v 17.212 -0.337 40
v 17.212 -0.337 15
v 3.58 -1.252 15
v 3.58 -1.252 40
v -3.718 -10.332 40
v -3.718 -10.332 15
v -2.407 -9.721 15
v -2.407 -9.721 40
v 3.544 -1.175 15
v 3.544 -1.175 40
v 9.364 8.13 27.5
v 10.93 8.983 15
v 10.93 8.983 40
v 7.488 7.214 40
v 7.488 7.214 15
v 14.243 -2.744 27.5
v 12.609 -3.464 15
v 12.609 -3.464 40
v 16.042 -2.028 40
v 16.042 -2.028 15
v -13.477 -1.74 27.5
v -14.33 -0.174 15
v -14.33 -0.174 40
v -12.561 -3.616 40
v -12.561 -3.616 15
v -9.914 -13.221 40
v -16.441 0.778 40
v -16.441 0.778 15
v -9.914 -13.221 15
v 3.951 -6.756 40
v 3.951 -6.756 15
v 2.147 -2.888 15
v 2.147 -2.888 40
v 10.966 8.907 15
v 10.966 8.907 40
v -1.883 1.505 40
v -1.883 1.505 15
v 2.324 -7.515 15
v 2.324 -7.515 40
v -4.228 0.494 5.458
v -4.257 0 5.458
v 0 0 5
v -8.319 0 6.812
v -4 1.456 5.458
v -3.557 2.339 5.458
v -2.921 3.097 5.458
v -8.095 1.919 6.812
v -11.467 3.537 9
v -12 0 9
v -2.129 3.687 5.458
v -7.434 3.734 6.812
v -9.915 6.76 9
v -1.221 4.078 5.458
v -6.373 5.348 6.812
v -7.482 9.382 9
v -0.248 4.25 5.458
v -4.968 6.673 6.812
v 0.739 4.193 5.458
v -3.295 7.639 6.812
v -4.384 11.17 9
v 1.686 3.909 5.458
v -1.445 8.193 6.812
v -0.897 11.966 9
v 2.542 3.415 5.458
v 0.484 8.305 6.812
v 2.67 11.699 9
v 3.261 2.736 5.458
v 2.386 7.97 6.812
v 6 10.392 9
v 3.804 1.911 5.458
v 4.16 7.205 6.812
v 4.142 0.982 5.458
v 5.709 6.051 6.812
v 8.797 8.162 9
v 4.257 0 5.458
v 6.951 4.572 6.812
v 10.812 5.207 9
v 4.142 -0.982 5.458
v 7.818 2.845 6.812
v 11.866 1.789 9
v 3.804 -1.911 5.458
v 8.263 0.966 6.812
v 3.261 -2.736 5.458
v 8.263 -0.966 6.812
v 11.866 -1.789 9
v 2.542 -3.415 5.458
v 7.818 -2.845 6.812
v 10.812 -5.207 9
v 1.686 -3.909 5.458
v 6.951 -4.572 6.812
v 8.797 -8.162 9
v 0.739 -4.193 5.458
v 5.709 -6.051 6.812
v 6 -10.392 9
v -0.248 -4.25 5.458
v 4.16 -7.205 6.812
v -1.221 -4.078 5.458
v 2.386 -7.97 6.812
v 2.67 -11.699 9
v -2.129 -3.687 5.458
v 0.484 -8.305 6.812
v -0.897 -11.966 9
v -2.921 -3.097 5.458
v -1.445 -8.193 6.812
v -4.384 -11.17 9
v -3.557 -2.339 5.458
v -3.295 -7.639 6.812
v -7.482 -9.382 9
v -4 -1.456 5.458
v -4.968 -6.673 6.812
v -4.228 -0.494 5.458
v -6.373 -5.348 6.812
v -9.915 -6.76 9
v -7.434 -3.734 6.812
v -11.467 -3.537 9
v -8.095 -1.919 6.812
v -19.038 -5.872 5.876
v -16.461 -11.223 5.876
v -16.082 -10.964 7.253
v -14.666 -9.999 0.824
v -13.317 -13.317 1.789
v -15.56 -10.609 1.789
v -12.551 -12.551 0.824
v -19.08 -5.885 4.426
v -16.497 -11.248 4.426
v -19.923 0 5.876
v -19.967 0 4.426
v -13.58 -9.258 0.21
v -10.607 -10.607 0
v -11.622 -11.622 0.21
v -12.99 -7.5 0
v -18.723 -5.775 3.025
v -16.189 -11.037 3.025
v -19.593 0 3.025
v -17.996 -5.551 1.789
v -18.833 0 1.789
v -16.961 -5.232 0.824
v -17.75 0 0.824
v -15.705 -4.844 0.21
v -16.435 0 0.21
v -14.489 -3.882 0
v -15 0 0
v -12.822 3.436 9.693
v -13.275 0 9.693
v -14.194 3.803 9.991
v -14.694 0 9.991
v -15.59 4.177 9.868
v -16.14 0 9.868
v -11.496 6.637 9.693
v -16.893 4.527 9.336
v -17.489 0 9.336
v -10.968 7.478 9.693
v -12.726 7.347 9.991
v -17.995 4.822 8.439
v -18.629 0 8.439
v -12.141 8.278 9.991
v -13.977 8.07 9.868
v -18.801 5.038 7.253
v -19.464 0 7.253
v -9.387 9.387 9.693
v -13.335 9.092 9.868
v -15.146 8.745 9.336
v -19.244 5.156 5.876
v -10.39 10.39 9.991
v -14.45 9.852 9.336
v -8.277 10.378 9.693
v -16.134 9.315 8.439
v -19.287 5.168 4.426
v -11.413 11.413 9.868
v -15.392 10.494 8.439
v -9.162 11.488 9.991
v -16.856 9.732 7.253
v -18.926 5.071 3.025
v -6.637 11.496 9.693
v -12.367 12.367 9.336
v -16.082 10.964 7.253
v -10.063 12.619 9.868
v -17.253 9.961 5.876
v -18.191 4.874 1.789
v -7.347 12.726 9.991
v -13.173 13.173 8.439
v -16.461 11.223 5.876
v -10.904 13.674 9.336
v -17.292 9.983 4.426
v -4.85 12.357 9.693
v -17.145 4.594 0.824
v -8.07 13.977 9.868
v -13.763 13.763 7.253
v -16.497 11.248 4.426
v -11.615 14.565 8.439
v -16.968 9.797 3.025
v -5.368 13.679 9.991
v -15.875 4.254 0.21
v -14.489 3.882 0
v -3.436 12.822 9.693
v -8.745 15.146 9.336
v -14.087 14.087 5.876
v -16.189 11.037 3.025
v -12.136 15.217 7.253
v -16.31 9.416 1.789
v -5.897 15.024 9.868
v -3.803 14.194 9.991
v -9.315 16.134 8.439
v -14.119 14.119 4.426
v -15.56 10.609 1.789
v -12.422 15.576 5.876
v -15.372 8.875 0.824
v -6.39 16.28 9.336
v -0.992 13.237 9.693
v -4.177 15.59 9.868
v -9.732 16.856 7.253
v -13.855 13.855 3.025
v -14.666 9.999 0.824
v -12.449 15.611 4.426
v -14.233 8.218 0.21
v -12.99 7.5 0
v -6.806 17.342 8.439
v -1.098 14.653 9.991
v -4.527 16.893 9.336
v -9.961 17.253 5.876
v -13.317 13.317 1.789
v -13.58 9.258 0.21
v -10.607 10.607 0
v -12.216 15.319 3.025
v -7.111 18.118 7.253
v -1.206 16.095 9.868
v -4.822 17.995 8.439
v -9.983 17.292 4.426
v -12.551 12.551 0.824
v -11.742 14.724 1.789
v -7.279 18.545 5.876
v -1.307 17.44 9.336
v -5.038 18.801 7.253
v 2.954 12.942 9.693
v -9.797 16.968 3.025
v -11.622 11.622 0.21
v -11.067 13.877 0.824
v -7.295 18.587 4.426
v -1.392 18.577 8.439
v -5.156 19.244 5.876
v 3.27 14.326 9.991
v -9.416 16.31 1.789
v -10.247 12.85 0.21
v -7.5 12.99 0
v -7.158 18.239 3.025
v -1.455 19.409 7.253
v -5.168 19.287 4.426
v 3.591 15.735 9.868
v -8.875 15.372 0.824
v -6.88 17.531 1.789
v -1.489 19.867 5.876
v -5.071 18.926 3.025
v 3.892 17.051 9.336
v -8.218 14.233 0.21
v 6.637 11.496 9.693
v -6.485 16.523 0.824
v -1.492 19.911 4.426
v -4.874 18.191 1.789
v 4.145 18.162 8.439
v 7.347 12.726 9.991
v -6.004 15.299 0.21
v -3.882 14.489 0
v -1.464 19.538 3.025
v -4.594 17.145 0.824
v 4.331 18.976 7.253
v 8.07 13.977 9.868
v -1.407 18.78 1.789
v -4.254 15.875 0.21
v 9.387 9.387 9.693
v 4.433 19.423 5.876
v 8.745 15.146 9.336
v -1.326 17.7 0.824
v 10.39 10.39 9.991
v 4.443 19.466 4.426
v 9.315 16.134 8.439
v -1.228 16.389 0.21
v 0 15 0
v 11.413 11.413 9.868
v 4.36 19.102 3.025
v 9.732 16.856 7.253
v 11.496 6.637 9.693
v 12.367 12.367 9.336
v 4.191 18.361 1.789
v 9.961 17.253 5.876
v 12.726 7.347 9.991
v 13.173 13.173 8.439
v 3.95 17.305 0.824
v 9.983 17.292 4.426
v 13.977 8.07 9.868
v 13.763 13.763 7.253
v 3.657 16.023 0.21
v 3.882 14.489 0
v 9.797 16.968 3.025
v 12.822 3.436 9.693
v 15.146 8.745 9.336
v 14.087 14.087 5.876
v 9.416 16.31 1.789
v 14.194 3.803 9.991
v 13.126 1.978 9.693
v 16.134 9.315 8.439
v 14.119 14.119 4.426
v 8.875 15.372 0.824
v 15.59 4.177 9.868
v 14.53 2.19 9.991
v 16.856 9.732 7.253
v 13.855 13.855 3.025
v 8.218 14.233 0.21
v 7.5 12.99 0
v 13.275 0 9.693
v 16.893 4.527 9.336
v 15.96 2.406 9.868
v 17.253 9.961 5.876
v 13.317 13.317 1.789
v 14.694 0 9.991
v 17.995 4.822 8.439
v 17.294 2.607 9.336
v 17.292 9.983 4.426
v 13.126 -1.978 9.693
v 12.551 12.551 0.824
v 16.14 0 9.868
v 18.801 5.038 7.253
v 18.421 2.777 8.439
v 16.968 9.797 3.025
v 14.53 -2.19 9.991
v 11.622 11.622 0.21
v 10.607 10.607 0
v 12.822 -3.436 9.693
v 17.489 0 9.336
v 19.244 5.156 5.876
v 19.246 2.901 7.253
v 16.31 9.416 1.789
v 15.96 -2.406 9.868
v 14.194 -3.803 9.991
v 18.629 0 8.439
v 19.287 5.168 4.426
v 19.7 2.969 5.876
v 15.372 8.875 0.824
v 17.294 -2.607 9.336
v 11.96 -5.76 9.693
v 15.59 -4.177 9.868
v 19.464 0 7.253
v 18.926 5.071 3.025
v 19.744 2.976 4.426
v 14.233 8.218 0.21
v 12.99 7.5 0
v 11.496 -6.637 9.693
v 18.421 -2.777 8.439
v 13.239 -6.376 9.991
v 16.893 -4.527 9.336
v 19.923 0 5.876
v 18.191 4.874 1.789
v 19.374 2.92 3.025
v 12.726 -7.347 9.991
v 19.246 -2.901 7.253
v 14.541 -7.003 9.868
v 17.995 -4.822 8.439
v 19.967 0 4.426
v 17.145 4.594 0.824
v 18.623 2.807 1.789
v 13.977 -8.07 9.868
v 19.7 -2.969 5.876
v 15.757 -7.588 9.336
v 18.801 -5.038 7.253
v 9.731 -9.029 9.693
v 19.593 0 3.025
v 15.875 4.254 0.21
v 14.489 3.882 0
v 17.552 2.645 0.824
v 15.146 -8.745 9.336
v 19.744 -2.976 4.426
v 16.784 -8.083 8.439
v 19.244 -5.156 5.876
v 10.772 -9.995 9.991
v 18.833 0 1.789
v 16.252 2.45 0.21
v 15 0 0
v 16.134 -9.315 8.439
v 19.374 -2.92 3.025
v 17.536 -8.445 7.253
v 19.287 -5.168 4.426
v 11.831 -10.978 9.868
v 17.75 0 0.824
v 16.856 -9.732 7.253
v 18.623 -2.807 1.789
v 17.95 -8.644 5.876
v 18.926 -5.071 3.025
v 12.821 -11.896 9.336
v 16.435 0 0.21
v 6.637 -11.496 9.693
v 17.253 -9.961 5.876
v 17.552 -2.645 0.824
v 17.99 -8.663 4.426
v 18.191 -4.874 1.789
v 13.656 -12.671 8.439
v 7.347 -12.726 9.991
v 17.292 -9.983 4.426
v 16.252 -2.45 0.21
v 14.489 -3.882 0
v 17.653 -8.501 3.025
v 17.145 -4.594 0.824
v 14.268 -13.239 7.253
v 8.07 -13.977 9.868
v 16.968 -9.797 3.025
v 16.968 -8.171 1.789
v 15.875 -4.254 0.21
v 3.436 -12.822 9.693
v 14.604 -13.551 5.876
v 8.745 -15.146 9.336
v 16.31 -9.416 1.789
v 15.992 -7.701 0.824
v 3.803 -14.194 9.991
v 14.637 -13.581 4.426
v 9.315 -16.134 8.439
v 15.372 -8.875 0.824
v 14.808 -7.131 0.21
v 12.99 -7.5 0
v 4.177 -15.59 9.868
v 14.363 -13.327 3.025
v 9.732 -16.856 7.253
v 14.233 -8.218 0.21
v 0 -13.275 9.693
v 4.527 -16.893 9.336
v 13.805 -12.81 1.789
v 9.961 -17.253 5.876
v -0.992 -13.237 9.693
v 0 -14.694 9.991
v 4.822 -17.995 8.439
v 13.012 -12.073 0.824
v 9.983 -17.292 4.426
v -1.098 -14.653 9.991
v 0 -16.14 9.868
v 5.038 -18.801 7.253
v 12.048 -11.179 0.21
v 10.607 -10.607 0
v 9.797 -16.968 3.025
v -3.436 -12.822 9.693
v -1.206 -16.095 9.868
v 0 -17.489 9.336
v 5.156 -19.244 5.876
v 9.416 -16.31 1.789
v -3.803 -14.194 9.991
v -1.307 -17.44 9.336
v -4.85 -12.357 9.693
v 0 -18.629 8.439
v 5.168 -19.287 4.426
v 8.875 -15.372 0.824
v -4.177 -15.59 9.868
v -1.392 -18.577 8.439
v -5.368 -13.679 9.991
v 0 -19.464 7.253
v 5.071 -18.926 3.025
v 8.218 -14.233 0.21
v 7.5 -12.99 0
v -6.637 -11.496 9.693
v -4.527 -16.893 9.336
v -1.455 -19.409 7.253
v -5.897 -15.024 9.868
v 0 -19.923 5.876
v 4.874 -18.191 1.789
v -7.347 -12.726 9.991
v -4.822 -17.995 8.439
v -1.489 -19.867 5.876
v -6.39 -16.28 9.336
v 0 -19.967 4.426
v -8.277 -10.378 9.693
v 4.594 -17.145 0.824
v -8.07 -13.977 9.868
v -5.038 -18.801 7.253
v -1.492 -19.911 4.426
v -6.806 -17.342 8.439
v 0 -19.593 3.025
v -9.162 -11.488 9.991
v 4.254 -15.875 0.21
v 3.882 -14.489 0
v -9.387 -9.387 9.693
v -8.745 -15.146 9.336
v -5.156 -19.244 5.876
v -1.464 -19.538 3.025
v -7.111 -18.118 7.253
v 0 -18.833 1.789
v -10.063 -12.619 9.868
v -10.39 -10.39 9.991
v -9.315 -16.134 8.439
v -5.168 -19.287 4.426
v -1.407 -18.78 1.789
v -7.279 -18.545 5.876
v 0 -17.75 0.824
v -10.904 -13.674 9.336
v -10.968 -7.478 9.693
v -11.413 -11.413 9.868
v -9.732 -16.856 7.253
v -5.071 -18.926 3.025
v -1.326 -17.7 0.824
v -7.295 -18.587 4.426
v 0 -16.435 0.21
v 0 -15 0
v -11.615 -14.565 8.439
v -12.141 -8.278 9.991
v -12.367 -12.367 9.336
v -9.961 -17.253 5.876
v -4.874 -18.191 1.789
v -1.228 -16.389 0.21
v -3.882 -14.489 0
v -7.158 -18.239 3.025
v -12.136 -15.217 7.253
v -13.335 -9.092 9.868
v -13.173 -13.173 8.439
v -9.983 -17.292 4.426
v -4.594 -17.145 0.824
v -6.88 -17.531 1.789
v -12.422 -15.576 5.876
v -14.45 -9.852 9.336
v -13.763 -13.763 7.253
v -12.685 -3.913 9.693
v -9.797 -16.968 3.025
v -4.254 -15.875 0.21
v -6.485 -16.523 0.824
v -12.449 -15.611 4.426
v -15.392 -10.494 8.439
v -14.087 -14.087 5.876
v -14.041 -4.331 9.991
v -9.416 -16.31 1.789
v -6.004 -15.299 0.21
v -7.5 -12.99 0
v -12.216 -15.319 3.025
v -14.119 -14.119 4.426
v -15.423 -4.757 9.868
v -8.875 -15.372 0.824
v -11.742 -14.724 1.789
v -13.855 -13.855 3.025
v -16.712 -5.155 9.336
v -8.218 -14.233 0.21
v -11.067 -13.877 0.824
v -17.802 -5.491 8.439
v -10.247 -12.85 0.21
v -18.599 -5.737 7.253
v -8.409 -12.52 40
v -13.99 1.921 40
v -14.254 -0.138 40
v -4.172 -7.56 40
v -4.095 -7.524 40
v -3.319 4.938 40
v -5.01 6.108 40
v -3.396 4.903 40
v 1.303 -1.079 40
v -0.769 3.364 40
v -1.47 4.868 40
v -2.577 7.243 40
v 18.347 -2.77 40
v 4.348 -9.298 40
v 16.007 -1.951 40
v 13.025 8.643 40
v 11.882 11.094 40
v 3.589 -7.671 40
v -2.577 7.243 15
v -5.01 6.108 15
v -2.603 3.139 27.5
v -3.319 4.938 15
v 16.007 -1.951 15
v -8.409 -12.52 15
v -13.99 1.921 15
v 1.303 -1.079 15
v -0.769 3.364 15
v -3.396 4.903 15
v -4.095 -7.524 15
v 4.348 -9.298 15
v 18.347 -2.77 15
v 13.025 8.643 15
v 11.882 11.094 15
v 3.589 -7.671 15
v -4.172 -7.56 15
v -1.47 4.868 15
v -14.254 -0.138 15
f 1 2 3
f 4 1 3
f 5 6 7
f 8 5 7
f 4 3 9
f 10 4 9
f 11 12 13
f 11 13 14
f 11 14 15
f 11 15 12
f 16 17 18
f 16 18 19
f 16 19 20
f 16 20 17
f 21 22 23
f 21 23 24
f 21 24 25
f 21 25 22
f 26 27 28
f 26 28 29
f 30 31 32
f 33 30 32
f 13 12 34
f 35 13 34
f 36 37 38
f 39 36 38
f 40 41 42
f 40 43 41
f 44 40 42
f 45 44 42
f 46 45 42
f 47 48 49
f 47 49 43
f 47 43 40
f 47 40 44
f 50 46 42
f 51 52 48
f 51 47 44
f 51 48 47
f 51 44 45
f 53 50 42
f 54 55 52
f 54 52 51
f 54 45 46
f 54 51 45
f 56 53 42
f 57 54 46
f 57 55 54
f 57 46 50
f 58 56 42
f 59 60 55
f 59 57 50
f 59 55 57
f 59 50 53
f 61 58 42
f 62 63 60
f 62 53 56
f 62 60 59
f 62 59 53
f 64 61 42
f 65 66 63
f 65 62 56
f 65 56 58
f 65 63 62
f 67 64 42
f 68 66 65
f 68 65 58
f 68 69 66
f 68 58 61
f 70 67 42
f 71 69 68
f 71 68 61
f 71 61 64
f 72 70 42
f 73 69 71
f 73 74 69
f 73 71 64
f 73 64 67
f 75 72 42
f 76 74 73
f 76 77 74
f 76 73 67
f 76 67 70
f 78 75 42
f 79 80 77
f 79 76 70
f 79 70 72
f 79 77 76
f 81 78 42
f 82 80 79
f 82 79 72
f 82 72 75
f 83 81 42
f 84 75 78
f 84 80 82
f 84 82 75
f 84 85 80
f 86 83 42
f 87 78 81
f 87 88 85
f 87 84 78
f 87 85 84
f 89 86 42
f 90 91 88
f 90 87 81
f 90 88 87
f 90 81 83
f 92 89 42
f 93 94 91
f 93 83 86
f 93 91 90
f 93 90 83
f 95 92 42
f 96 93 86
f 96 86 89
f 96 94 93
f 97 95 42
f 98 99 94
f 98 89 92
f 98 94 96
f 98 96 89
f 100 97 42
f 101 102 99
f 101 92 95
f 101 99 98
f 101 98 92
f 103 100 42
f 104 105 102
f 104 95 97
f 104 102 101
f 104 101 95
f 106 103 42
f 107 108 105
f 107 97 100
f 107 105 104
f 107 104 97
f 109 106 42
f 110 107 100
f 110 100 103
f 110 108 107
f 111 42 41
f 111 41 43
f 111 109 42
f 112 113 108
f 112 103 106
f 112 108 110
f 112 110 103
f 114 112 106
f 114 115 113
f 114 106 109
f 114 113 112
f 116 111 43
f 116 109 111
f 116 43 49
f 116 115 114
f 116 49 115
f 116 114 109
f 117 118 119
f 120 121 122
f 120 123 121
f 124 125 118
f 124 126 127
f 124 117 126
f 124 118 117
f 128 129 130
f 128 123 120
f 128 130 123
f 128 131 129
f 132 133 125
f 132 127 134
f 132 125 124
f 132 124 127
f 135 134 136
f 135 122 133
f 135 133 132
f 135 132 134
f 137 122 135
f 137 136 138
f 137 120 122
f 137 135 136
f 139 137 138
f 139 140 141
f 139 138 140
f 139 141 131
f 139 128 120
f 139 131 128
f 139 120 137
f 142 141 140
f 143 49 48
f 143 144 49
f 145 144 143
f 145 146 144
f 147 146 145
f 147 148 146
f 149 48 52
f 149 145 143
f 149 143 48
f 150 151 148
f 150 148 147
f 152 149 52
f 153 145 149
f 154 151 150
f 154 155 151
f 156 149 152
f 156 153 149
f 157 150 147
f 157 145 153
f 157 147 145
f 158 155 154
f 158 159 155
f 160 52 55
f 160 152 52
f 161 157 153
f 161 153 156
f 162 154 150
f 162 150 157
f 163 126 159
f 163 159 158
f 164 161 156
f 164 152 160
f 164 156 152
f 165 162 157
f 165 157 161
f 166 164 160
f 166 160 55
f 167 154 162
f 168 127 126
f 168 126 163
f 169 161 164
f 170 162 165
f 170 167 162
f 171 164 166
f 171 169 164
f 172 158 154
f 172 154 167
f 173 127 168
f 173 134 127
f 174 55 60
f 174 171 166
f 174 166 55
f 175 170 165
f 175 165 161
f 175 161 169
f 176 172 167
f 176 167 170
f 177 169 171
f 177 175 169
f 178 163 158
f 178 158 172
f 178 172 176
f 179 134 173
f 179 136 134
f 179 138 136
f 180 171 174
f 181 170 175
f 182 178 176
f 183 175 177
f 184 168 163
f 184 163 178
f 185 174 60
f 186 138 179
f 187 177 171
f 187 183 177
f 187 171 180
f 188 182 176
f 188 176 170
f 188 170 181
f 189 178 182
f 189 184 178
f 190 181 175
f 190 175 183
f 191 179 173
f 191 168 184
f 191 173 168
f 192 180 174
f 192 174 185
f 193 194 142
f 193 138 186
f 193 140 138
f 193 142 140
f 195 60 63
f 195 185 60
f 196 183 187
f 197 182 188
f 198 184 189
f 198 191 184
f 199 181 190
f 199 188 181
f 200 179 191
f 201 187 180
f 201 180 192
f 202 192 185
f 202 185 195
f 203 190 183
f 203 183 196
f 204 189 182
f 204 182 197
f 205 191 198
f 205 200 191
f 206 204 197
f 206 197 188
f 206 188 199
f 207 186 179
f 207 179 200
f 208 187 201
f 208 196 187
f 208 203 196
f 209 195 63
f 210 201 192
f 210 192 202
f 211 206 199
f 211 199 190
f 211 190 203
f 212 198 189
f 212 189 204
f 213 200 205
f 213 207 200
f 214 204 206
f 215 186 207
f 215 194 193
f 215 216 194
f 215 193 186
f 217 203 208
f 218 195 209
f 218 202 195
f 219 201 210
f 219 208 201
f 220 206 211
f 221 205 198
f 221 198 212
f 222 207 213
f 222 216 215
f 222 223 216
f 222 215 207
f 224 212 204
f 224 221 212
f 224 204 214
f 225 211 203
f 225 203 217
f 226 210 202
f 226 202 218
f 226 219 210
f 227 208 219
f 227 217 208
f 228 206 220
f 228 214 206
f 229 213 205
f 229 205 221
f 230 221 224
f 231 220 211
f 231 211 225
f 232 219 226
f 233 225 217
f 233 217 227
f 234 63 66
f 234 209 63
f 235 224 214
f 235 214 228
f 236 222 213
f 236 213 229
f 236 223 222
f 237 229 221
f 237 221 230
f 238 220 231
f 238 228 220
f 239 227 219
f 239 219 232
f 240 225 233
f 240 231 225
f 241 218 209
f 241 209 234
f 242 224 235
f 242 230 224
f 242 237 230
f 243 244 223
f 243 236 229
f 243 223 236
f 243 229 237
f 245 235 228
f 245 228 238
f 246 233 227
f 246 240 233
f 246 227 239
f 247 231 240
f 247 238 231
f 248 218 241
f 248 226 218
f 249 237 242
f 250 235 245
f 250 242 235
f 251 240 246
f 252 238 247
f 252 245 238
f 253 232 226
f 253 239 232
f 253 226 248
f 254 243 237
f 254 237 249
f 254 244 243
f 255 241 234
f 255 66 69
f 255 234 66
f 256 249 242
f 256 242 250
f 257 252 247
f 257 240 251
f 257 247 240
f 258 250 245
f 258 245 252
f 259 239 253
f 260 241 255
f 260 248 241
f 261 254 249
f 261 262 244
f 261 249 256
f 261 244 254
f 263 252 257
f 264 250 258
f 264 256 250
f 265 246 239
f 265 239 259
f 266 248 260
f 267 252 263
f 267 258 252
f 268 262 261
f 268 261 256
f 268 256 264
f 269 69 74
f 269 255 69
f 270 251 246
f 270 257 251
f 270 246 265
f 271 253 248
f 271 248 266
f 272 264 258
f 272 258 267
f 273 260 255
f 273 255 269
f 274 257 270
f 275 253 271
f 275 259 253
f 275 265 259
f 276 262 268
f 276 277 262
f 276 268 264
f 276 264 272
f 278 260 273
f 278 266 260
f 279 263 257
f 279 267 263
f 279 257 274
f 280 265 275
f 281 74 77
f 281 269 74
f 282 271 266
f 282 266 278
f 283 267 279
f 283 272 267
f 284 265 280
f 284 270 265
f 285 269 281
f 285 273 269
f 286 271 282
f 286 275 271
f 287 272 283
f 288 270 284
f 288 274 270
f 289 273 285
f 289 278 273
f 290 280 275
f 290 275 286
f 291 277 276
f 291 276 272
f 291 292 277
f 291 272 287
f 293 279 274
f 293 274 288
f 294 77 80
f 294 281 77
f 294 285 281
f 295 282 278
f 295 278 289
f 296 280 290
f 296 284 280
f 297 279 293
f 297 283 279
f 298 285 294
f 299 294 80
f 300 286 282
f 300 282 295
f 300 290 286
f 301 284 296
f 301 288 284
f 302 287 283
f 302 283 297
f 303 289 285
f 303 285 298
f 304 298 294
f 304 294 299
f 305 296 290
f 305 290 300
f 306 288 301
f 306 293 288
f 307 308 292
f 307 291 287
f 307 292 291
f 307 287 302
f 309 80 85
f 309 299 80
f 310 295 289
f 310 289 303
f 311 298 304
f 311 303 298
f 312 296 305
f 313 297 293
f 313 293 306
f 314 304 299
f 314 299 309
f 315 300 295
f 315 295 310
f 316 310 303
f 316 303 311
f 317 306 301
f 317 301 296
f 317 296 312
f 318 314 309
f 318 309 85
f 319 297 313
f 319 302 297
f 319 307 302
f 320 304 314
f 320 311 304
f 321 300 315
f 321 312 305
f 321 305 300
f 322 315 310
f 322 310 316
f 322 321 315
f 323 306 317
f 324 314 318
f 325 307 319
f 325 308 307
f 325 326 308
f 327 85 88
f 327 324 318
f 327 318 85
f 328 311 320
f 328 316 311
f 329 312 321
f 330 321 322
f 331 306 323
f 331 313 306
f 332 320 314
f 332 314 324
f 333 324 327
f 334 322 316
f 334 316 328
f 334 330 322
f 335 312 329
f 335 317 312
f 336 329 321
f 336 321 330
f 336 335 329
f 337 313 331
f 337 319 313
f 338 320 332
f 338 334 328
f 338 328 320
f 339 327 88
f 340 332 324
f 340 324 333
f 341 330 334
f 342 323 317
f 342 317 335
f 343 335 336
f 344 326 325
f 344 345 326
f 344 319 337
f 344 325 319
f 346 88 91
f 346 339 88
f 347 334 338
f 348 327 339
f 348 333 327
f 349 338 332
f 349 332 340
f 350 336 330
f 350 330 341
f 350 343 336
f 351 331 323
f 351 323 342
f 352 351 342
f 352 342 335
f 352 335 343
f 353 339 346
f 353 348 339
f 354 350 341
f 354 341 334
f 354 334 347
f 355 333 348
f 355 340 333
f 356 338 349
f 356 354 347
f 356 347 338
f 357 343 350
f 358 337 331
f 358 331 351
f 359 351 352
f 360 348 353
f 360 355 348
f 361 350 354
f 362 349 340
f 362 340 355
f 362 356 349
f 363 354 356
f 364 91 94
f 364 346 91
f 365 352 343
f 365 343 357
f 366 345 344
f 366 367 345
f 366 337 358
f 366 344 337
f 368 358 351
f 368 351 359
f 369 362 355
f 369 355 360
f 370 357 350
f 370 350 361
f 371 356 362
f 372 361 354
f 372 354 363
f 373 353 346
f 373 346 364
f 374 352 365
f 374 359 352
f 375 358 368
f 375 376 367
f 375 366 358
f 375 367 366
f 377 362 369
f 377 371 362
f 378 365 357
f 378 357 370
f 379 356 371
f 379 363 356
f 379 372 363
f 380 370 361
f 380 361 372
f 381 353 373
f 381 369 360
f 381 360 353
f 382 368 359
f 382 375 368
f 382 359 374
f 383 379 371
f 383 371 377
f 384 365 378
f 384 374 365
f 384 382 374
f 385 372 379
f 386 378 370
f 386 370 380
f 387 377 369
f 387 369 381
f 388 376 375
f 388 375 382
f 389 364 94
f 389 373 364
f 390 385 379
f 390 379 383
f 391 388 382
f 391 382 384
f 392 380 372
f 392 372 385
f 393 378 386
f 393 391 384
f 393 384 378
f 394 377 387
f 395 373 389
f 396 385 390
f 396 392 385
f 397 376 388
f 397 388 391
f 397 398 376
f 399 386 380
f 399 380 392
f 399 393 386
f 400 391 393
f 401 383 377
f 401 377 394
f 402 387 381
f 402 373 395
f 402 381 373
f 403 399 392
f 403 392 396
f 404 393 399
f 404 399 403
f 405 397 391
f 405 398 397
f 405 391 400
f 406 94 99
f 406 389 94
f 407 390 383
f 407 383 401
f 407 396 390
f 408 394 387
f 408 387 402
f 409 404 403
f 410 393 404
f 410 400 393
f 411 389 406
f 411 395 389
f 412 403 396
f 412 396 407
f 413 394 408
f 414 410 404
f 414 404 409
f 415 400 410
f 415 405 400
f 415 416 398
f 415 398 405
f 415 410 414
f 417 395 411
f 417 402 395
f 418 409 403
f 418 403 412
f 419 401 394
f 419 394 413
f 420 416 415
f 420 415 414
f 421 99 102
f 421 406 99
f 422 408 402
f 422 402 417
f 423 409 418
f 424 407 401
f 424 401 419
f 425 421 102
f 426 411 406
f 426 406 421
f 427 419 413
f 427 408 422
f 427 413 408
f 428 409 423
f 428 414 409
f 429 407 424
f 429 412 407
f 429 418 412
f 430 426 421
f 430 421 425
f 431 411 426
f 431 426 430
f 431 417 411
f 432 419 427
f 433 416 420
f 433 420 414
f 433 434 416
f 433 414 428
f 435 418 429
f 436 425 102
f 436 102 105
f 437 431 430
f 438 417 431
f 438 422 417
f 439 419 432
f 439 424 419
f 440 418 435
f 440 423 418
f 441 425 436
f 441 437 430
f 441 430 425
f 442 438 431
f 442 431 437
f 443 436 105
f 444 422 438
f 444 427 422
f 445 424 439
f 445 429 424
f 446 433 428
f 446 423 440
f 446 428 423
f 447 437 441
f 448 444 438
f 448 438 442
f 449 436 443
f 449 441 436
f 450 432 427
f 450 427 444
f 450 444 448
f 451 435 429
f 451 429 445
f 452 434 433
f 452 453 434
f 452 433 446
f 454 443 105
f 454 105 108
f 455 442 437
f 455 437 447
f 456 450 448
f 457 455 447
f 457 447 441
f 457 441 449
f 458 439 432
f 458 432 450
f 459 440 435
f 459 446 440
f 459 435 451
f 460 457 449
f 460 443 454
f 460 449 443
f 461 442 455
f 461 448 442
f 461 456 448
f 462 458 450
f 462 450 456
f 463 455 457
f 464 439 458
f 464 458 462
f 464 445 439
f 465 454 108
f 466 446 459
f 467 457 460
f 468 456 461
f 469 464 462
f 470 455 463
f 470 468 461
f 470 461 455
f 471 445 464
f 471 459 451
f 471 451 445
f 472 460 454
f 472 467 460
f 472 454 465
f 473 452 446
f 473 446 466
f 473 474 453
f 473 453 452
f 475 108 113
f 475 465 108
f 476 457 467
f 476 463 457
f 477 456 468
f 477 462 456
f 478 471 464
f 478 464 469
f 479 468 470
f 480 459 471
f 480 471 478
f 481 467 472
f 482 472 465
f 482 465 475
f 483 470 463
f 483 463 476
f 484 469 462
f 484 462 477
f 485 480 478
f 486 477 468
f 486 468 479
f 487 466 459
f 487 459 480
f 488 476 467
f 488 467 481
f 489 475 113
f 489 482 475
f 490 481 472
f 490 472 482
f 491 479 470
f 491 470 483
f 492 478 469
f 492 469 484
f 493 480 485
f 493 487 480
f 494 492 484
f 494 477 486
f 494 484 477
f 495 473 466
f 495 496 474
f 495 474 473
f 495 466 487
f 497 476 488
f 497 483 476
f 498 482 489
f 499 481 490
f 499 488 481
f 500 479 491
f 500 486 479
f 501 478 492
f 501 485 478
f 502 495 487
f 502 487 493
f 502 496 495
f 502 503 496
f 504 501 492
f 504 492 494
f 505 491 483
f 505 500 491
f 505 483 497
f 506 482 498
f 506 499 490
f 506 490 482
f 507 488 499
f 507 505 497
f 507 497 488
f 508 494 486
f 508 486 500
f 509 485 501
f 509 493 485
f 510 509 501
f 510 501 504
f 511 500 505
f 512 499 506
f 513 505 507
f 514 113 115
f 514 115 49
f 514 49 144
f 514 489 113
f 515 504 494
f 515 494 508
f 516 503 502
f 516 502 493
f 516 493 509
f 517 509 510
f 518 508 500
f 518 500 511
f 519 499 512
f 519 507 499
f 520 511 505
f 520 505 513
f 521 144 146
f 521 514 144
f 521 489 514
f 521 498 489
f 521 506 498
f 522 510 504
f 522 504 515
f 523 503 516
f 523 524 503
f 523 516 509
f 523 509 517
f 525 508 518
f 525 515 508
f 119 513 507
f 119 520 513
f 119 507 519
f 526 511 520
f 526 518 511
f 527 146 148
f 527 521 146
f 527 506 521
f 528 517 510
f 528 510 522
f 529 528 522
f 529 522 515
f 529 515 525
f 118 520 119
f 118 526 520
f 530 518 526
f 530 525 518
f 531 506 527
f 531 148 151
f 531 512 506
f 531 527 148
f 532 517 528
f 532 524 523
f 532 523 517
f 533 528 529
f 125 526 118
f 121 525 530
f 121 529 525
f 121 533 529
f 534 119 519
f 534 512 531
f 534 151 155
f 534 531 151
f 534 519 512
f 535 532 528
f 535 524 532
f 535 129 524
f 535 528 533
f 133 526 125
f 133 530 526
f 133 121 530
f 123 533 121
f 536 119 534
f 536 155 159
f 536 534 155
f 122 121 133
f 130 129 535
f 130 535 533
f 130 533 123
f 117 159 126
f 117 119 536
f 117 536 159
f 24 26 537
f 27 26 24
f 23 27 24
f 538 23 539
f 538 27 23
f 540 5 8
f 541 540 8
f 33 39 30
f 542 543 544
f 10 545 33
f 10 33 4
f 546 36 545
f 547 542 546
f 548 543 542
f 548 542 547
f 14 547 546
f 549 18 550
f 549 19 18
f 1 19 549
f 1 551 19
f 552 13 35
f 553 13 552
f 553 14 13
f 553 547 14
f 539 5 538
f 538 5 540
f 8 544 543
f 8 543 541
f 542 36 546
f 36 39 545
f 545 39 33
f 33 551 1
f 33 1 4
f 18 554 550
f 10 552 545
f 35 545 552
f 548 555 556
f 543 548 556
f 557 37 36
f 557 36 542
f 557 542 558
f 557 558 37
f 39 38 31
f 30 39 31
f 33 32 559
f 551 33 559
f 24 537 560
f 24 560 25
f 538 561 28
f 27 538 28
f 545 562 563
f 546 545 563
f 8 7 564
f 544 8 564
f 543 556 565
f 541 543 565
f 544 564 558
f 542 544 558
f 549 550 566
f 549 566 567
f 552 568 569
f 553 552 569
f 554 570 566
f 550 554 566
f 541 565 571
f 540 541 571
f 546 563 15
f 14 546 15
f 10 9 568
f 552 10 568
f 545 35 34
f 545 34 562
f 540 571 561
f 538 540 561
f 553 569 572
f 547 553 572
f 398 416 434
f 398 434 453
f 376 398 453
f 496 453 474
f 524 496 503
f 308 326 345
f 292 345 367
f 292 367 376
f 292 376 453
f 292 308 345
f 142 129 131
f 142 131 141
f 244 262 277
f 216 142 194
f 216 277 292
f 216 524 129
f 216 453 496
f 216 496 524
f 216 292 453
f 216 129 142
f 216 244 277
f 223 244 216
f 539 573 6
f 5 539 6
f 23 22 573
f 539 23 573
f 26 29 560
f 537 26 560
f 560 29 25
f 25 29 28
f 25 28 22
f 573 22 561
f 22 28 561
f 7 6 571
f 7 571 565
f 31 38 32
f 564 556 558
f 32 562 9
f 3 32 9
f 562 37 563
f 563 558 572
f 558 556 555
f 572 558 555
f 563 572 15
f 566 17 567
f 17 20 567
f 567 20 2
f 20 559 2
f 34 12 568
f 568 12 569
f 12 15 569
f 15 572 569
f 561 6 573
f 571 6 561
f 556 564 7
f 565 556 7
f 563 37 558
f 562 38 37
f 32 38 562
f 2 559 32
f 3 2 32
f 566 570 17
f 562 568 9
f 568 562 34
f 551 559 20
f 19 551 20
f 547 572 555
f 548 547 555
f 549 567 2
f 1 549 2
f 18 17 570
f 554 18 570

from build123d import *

# Parameters (mm, degrees)
F4_DEPTH = 25


with BuildPart() as f1:
    # F0 (on Front) → F1 (revolve)
    with BuildSketch(Plane.XZ):
        with BuildLine():
            ThreePointArc((0, 5), (-6.3245553203, 6.026334039), (-12, 9))
            ThreePointArc((-12, 9), (-19.7434164903, 6.5811388301), (-15, 0))
            Line((-15, 0), (0, 0))
            Line((0, 0), (0, 5))
        make_face()
    revolve(axis=Axis((0, 0, 2.5), (0, 0, -1)))


with BuildPart() as f4:
    # F3 (on offset) → F4 (new body)
    with BuildSketch(Plane.XY.offset(15)):
        with BuildLine():
            Line((-14.2537592146, -0.138063944), (-3.71841477, -10.3323267397))
            Line((-3.71841477, -10.3323267397), (-2.4070676478, -9.720835534))
            Line((-2.4070676478, -9.720835534), (-3.3959341978, 4.9026423091))
            Line((-3.3959341978, 4.9026423091), (-3.3193368191, 4.9383602534))
            add(Edge.make_bspline(
                [(-1.8825586584, 1.5052120114), (-2.6054898501, 3.0555429551), (-3.3193368191, 4.9383602534)],
                knots=[0, 0, 0, 1, 1, 1], degree=2))
            Line((-1.8825586584, 1.5052120114), (2.3235864569, -7.514895297))
            Line((2.3235864569, -7.514895297), (3.9505147792, -6.756246161))
            Line((3.9505147792, -6.756246161), (2.1468541816, -2.8882835272))
            Line((2.1468541816, -2.8882835272), (1.3830511721, -2.9399332958))
            Line((1.3830511721, -2.9399332958), (0.7715599665, -1.6285861735))
            Line((0.7715599665, -1.6285861735), (1.3032305626, -1.079126838))
            Line((1.3032305626, -1.079126838), (-0.7686408704, 3.3640157885))
            Line((-0.7686408704, 3.3640157885), (-1.4158069396, 3.0622372943))
            Line((-1.4158069396, 3.0622372943), (-2.1173073648, 4.5666098107))
            Line((-2.1173073648, 4.5666098107), (-1.4701412955, 4.8683883049))
            Line((-1.4701412955, 4.8683883049), (-2.5772967126, 7.2426907588))
            Line((-2.5772967126, 7.2426907588), (-5.0100294581, 6.1082888494))
            Line((-5.0100294581, 6.1082888494), (-4.0954151998, -7.5240311807))
            Line((-4.0954151998, -7.5240311807), (-4.1720125784, -7.559749125))
            Line((-4.1720125784, -7.559749125), (-13.9903061296, 1.9207170651))
            Line((-13.9903061296, 1.9207170651), (-16.441422246, 0.777742849))
            Line((-16.441422246, 0.777742849), (-9.9136107543, -13.2211940709))
            Line((-9.9136107543, -13.2211940709), (-8.4092382378, -12.5196936457))
            Line((-8.4092382378, -12.5196936457), (-12.5610920778, -3.6160143529))
            add(Edge.make_bspline(
                [(-14.3303565933, -0.1737818883), (-13.5083319594, -1.5846518714), (-12.5610920778, -3.6160143529)],
                knots=[0, 0, 0, 1, 1, 1], degree=2))
            Line((-14.3303565933, -0.1737818883), (-14.2537592146, -0.138063944))
        make_face()
        Polygon((1.3830511721, -2.9399332958), (2.1468541816, -2.8882835272), (1.3032305626, -1.079126838), (0.7715599665, -1.6285861735), align=None)
        with BuildLine():
            Line((1.3032305626, -1.079126838), (2.1468541816, -2.8882835272))
            Line((2.1468541816, -2.8882835272), (16.0065290153, -1.9510667458))
            Line((16.0065290153, -1.9510667458), (16.0422469595, -2.0276641244))
            add(Edge.make_bspline(
                [(12.6090987176, -3.4644422852), (14.1594296612, -2.7415110935), (16.0422469595, -2.0276641244)],
                knots=[0, 0, 0, 1, 1, 1], degree=2))
            Line((12.6090987176, -3.4644422852), (3.5889914092, -7.6705874005))
            Line((3.5889914092, -7.6705874005), (4.3476405451, -9.2975157227))
            Line((4.3476405451, -9.2975157227), (18.346577465, -2.769704231))
            Line((18.346577465, -2.769704231), (17.2121755555, -0.3369714854))
            Line((17.2121755555, -0.3369714854), (3.5798555254, -1.2515857438))
            Line((3.5798555254, -1.2515857438), (3.5441375812, -1.1749883651))
            Line((3.5441375812, -1.1749883651), (13.0246037712, 8.6433051861))
            Line((13.0246037712, 8.6433051861), (11.8816295551, 11.0944213025))
            Line((11.8816295551, 11.0944213025), (-1.4701412955, 4.8683883049))
            Line((-1.4701412955, 4.8683883049), (-0.7686408704, 3.3640157885))
            Line((-0.7686408704, 3.3640157885), (7.4878723532, 7.2140911343))
            add(Edge.make_bspline(
                [(10.9301048178, 8.9833556497), (9.5192348347, 8.1613310159), (7.4878723532, 7.2140911343)],
                knots=[0, 0, 0, 1, 1, 1], degree=2))
            Line((10.9301048178, 8.9833556497), (10.9658227621, 8.9067582711))
            Line((10.9658227621, 8.9067582711), (1.3032305626, -1.079126838))
        make_face()
        Polygon((-1.4158069396, 3.0622372943), (-0.7686408704, 3.3640157885), (-1.4701412955, 4.8683883049), (-2.1173073648, 4.5666098107), align=None)
    extrude(amount=F4_DEPTH)


solid = Compound([f1.part, f4.part])
